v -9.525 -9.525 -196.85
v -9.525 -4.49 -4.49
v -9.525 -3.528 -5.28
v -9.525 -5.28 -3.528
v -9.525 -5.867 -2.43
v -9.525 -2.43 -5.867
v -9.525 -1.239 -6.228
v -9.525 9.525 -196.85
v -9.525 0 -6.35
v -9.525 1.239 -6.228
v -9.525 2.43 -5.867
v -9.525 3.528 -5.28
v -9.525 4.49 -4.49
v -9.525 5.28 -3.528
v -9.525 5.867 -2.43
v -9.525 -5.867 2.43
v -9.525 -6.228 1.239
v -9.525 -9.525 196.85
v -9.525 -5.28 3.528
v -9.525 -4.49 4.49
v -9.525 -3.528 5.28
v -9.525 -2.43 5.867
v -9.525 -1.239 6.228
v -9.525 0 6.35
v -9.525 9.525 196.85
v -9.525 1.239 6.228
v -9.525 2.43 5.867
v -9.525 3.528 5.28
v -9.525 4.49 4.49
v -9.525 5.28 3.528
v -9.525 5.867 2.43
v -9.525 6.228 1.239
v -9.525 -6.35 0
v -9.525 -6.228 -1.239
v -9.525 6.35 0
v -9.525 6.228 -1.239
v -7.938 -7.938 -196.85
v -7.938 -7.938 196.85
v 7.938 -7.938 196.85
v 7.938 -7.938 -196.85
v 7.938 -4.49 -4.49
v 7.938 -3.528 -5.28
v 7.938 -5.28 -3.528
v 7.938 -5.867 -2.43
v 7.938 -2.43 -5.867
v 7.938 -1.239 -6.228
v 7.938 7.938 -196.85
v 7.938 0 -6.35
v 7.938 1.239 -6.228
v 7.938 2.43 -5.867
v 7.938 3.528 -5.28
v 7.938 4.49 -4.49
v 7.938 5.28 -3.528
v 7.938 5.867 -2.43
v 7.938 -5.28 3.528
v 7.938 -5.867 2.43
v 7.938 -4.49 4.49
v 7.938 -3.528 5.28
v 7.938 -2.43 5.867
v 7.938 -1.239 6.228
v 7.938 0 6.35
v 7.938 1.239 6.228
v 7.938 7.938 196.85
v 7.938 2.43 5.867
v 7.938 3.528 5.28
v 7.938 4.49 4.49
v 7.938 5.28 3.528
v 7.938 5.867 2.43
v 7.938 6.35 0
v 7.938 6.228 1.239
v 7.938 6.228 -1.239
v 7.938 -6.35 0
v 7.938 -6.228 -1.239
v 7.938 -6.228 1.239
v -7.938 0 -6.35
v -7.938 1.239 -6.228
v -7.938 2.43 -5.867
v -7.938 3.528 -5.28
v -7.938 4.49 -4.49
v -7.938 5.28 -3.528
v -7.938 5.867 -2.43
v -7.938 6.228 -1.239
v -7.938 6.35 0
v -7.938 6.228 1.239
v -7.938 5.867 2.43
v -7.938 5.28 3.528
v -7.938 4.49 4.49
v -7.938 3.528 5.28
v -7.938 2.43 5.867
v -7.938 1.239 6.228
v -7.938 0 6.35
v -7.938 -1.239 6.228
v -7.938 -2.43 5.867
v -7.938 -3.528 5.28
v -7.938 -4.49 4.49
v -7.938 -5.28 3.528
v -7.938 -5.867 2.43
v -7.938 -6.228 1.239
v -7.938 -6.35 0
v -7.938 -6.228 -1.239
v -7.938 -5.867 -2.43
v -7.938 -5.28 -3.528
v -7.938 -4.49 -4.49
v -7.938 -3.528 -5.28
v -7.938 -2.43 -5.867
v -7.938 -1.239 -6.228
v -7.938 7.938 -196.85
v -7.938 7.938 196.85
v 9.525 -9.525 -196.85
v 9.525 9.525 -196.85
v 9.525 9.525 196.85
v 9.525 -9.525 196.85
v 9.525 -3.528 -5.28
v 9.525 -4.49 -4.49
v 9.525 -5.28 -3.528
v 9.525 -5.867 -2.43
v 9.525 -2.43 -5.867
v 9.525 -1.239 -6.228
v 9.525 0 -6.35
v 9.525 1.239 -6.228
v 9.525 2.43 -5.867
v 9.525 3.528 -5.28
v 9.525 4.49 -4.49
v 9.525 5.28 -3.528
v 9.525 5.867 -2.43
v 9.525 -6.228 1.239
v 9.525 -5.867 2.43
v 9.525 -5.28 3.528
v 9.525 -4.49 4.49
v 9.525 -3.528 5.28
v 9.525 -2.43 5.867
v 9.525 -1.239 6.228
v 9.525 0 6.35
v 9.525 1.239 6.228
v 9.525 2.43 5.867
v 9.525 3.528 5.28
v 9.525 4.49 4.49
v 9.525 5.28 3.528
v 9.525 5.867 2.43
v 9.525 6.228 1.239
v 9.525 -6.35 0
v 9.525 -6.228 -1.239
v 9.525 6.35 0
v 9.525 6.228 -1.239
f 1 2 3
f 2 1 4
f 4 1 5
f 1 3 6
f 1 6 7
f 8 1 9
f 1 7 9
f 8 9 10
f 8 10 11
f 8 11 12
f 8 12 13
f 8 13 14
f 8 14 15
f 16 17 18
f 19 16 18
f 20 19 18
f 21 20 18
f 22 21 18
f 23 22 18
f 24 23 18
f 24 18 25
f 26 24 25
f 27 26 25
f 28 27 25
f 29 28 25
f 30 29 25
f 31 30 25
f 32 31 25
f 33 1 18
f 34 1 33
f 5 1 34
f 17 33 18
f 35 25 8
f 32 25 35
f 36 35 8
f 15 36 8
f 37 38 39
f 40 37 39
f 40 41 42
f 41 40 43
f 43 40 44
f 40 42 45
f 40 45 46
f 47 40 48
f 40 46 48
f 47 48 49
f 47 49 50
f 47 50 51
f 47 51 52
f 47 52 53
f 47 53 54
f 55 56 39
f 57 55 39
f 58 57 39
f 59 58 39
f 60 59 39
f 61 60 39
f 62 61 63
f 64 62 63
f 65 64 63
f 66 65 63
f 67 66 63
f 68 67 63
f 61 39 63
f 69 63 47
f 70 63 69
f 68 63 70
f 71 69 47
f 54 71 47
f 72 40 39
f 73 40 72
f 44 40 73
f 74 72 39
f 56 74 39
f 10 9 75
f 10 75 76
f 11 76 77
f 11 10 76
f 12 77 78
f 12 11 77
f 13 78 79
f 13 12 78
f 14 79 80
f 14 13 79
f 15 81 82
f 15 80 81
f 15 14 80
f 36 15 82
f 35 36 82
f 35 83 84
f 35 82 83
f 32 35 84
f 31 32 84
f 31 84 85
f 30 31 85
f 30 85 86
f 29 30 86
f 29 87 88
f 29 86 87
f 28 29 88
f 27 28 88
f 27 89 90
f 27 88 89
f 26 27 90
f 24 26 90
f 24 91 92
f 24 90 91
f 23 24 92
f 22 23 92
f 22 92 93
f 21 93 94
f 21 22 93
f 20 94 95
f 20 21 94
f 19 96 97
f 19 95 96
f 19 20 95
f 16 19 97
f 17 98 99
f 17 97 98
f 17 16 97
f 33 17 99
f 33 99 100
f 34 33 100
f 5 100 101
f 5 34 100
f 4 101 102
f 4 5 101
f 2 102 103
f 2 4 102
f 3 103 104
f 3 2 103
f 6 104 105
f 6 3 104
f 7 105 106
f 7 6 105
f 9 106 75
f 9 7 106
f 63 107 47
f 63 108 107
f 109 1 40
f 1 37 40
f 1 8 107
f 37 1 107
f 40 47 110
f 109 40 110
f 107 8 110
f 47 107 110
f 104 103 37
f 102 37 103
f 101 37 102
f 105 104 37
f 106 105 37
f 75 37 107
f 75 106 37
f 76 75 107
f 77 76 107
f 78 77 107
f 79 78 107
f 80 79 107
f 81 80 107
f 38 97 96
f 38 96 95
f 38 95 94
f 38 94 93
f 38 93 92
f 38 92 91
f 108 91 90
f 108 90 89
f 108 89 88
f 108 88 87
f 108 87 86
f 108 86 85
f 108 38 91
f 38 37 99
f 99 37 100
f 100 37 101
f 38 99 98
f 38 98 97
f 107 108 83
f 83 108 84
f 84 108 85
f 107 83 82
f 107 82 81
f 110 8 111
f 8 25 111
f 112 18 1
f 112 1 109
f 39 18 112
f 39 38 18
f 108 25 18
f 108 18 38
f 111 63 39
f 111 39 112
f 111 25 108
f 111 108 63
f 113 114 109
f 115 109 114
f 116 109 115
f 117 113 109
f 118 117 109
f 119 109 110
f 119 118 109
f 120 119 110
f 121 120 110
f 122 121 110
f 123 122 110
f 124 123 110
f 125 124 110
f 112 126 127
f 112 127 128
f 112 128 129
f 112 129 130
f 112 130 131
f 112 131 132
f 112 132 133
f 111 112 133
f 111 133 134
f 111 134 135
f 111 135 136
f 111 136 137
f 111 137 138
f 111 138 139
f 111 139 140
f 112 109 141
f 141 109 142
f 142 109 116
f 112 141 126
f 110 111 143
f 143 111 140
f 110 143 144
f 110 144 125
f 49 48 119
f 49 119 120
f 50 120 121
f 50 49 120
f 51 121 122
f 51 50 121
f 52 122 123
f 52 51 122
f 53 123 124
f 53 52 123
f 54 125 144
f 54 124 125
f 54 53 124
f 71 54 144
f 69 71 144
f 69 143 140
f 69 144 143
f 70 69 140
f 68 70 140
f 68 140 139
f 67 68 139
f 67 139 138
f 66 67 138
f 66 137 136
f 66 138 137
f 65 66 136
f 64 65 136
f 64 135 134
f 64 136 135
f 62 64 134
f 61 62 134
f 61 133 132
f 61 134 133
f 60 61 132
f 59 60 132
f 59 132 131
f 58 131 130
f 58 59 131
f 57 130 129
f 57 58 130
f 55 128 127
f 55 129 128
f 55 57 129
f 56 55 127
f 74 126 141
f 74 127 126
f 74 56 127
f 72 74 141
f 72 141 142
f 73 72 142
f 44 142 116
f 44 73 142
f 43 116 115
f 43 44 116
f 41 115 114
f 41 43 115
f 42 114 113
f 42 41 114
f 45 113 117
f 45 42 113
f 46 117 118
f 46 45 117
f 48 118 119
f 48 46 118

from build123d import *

# Parameters (mm, degrees)
SKETCH1_W               = 19.05
SKETCH1_H               = 19.05
SKETCH1_W_2             = 15.875
SKETCH1_H_2             = 15.875
BOSS_EXTRUDE1_DEPTH     = 196.85
CUT_EXTRUDE1_DEPTH      = 198.310348816
CUT_EXTRUDE1_DEPTH_BACK = 198.310348816
SKETCH2_R               = 6.35


with BuildPart() as part:
    # Sketch1 → Boss-Extrude1 (new, symmetric)
    with BuildSketch(Plane.XY):
        Rectangle(SKETCH1_W, SKETCH1_H)
        Rectangle(SKETCH1_W_2, SKETCH1_H_2, mode=Mode.SUBTRACT)
    extrude(amount=BOSS_EXTRUDE1_DEPTH, both=True)

    # Sketch2 → Cut-Extrude1 (cut, two sides: drawn at the far end of the back side and taken through both)
    with BuildSketch(Plane(origin=(0, 0, 0), x_dir=(0, 0, -1), z_dir=(1, 0, 0)).offset(-CUT_EXTRUDE1_DEPTH_BACK)):
        Circle(SKETCH2_R)
    extrude(amount=CUT_EXTRUDE1_DEPTH + CUT_EXTRUDE1_DEPTH_BACK, mode=Mode.SUBTRACT)


solid = part.part
